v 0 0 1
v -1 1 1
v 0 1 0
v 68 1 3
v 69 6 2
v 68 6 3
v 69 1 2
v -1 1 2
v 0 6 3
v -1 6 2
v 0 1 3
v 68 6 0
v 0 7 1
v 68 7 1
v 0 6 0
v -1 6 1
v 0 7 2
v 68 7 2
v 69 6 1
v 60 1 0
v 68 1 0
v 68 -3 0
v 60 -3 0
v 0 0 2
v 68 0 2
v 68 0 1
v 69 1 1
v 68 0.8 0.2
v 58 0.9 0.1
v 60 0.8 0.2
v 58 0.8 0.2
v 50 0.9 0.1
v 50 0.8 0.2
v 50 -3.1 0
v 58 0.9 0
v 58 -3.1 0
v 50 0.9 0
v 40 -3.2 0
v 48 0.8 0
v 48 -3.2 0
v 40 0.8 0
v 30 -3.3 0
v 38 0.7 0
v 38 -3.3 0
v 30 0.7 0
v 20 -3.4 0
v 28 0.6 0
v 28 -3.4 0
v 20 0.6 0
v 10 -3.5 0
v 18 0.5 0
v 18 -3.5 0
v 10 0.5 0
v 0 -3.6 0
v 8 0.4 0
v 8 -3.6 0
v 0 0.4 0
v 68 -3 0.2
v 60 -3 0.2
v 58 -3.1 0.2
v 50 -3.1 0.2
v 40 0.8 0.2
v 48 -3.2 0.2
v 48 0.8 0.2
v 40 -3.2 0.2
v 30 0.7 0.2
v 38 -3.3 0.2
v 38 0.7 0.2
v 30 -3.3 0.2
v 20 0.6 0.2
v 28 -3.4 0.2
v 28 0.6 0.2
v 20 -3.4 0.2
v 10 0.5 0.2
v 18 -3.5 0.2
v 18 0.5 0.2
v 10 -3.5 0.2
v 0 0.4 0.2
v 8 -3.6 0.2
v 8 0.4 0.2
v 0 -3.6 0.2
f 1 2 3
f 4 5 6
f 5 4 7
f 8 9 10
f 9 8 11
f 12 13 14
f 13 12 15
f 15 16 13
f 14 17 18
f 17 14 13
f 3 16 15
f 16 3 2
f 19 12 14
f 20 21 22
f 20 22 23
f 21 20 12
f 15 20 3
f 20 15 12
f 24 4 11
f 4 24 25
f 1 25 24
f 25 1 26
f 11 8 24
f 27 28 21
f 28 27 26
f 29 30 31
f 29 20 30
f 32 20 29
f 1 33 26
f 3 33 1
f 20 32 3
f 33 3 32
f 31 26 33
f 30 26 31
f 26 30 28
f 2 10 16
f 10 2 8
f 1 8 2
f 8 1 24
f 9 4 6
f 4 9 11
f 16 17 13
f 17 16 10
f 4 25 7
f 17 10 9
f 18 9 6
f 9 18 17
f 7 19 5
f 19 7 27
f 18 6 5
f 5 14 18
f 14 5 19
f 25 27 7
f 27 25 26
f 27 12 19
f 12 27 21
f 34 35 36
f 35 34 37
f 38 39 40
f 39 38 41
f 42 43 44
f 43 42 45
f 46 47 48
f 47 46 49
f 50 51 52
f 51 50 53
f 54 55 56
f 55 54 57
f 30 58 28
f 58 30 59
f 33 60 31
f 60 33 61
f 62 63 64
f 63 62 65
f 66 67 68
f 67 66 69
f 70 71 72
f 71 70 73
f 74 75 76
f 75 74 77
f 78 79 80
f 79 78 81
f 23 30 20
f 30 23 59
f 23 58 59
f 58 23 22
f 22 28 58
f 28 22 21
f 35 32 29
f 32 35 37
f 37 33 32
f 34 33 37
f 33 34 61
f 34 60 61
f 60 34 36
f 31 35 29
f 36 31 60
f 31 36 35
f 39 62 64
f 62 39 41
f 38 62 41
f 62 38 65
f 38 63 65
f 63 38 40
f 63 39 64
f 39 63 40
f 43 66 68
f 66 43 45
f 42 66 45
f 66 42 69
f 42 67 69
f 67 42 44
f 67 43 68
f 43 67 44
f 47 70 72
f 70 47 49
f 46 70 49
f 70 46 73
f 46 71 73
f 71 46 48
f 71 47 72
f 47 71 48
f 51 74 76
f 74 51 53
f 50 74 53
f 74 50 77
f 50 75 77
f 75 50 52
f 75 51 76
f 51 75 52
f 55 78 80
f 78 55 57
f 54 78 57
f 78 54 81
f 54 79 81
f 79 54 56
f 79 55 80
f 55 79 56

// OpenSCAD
// file: common.scad
$fa = 5;
$fs = 0.2;

// Standard print layer.
$zstep = 0.2;

eps = 0.0001;

// Clearance for a loose fitting joint (like a slide). Note that
// you typically have to take this much off both sides.
loose_clearance = 0.2;

function circ(x) = 1-sqrt(1-x*x);

// Radius 1mm. Centered. Extends along the Y axis.
module round_rail(length) {
  rotate([90, 0, 0])
    translate([0, 0, -length/2])
      cylinder(length, 1);
}

// Major radius 1mm. Centered. Extends along the Y axis.
module square_rail(length, major_radius=1) {
  rotate([90, 45, 0])
    cube([major_radius*sqrt(2), major_radius*sqrt(2), length], center=true);
}

module octahedron(major_radius=1) {
  // Top and bottom halves.
  for (a = [-1, 1])
    scale([1, 1, a])
      // Extrude a square into a pyramid.
      linear_extrude(major_radius, scale=0)
        rotate([0, 0, 45])
          square(sqrt(2)*major_radius, center=true);
}

module chamfered_cube(dims, chamfer=1) {
  assert(dims.x >= 2*chamfer);
  assert(dims.y >= 2*chamfer);
  assert(dims.z >= 2*chamfer);

  hull()
    for (a = [0, 1], b = [0, 1], c = [0, 1])
        translate([
          (dims.x - 2*chamfer) * a + chamfer,
          (dims.y - 2*chamfer) * b + chamfer,
          (dims.z - 2*chamfer) * c + chamfer
        ])
          octahedron(chamfer);
}
// main file
include <common.scad>

translate([-1, 0, 0])
  chamfered_cube([70, 7, 3]);

translate([0, -4, 0]) {
  linear_extrude(0.2) {
    translate([0, 0.4, 0]) square([8, 4]);
    translate([10, 0.5, 0]) square([8, 4]);
    translate([20, 0.6, 0]) square([8, 4]);
    translate([30, 0.7, 0]) square([8, 4]);
    translate([40, 0.8, 0]) square([8, 4]);
    translate([50, 0.9, 0]) square([8, 4]);
    translate([60, 1.0, 0]) square([8, 4]);
  }
}

// TODO: the test indicates that 0.3 is a good offset from under a bevel.
